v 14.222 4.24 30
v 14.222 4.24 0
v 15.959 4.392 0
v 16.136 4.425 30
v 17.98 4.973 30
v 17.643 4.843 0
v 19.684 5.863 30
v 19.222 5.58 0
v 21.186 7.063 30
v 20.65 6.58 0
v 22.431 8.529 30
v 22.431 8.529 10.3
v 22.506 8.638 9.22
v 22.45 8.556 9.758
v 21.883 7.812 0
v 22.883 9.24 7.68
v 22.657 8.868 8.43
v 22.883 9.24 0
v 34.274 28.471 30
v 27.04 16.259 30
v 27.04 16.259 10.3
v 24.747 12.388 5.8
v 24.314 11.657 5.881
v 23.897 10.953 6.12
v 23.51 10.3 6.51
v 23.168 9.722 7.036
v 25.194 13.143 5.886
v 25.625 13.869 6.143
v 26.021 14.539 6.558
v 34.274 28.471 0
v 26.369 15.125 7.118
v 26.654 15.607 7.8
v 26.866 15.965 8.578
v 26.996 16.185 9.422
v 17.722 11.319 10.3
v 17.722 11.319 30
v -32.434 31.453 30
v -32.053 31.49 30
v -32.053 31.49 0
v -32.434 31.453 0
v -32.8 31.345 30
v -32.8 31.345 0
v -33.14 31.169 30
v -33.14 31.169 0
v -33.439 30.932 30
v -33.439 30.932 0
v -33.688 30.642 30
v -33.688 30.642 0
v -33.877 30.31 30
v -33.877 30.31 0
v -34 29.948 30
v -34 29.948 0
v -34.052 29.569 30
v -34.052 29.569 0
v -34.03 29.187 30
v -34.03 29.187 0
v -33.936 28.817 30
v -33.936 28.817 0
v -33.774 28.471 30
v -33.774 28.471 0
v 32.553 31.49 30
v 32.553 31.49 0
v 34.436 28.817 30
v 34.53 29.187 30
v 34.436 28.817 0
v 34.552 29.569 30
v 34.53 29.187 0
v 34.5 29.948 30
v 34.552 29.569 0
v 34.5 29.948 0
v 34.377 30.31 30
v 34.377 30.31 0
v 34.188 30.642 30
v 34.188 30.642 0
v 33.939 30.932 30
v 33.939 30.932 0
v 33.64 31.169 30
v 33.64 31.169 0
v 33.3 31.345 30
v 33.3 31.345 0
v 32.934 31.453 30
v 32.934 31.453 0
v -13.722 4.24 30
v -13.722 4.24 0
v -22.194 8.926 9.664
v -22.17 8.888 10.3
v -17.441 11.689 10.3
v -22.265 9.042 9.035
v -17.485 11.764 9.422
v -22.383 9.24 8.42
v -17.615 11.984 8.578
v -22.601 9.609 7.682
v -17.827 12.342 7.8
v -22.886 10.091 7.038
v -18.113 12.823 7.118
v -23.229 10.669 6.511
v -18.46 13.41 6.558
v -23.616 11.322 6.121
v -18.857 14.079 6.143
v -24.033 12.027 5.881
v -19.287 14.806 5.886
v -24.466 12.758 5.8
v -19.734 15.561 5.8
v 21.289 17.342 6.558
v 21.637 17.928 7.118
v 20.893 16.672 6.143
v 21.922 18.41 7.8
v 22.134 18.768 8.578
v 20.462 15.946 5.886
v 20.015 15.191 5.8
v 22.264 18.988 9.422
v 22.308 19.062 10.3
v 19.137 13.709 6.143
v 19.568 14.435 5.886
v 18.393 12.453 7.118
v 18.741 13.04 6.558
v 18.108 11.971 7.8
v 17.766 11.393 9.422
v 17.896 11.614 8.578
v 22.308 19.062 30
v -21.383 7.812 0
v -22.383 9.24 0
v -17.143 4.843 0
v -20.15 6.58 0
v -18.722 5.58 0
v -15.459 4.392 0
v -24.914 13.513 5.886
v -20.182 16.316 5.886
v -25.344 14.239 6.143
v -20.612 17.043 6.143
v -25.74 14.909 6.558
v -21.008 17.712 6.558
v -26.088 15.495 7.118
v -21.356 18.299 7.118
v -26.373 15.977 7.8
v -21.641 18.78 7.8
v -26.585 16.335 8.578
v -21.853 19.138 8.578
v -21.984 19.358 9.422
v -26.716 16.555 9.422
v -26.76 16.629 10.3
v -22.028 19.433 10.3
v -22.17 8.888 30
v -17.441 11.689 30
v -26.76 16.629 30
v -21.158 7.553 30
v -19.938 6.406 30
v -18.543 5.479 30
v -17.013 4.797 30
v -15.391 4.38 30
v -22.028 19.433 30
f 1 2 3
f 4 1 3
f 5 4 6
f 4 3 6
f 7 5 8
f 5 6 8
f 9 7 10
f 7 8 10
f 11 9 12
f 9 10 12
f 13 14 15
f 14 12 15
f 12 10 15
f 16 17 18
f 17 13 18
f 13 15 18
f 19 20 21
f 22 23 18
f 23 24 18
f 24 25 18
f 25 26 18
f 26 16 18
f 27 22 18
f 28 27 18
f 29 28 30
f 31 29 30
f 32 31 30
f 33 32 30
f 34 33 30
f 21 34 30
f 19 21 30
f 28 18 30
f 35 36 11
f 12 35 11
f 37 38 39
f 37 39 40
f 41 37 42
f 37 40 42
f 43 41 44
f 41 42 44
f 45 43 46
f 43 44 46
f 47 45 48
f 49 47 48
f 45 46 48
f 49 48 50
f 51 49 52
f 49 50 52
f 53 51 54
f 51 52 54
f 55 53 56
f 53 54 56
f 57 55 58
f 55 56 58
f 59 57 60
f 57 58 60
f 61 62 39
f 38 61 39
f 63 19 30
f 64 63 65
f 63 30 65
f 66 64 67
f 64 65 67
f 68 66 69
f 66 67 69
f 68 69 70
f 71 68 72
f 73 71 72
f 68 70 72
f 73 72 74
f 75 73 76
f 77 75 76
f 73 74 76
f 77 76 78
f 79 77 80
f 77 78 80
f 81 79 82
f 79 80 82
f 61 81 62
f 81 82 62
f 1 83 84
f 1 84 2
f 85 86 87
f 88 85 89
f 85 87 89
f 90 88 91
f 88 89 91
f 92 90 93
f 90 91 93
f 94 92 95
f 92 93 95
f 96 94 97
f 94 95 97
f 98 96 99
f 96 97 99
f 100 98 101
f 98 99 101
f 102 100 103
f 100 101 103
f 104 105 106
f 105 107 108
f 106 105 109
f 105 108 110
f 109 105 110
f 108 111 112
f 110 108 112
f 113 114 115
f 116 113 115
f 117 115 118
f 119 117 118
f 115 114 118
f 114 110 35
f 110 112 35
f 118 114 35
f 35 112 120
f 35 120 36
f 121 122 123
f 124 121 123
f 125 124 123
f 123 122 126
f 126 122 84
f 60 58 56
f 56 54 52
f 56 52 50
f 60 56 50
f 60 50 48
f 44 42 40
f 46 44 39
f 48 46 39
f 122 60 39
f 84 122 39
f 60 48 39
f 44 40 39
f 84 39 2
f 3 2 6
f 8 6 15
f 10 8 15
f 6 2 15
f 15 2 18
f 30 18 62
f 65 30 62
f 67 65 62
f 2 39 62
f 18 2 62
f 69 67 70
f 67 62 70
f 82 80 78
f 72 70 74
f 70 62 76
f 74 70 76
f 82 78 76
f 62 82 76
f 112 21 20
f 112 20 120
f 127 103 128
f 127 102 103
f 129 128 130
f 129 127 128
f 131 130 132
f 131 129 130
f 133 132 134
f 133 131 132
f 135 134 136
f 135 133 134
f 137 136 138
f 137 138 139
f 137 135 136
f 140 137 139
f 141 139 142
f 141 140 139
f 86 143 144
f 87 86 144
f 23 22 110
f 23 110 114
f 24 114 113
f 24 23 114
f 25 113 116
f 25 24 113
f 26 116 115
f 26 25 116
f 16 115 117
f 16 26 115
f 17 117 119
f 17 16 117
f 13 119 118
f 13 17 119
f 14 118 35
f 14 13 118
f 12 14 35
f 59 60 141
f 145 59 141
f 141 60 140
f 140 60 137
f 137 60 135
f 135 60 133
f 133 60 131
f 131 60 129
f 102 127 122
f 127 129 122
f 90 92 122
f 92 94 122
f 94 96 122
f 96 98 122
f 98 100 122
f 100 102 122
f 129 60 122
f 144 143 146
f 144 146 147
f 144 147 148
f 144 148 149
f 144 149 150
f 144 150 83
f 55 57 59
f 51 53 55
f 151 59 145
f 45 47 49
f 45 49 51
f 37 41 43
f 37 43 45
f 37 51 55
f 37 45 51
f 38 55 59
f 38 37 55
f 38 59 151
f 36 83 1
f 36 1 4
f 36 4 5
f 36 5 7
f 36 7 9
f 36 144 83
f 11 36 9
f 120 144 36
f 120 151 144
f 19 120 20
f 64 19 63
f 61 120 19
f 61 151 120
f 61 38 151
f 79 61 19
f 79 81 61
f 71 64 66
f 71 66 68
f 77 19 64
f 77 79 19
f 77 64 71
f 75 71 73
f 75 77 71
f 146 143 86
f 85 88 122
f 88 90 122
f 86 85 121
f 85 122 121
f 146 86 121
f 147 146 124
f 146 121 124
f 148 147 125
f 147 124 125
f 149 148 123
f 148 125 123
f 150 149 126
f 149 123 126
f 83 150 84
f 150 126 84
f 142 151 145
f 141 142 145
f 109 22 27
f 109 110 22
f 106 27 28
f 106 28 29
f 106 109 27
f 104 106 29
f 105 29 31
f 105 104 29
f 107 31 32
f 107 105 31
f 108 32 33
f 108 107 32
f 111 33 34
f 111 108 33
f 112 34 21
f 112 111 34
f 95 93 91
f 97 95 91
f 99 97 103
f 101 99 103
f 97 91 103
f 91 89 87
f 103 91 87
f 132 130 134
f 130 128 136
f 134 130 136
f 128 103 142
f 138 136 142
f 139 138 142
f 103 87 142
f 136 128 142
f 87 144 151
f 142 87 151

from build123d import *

# Parameters (mm, degrees)
F1_DEPTH = 30
F3_DEPTH = 24.2
F4_R     = 4.49999


# Not quite as in the source:
# - a fillet or chamfer is up to 0.001 mm smaller than in the source, because OpenCascade refuses the exact size


with BuildPart() as f1:
    # F0 (on Top) → F1 (new body)
    with BuildSketch(Plane.XY):
        with BuildLine():
            Line((-13.7223101757, 4.24), (14.2223098243, 4.24))
            ThreePointArc((14.2223098243, 4.24), (19.2223098243, 5.5797459622), (22.8825638622, 9.24))
            Line((22.8825638622, 9.24), (34.2739440306, 28.4706991862))
            ThreePointArc((34.2739440306, 28.4706991862), (34.2907944109, 30.4803025731), (32.5531808711, 31.49))
            Line((32.5531808711, 31.49), (-32.0531791289, 31.49))
            ThreePointArc((-32.0531791289, 31.49), (-33.7907926288, 30.4803026431), (-33.7739423706, 28.4706993249))
            Line((-33.7739423706, 28.4706993249), (-22.3825642135, 9.24))
            ThreePointArc((-22.3825642135, 9.24), (-18.7223101757, 5.5797459622), (-13.7223101757, 4.24))
        make_face()
    extrude(amount=F1_DEPTH)

    # F2 (on face) → F3 (cut)
    with BuildSketch(Plane.XY.offset(30)):
        with BuildLine():
            Line((-26.759759987, 16.6294953398), (-22.3825642135, 9.24))
            ThreePointArc((-22.3825642135, 9.24), (-22.2778836833, 9.0629195529), (-22.1695828196, 8.8880298132))
            Line((-22.1695828196, 8.8880298132), (-17.4408080346, 11.6891376089))
            Line((-17.4408080346, 11.6891376089), (-22.0276610725, 19.4325721963))
            Line((-22.0276610725, 19.4325721963), (-26.759759987, 16.6294953398))
        make_face()
        with BuildLine():
            Line((17.7215177836, 11.3189368702), (22.4312077057, 8.5291335532))
            ThreePointArc((22.4312077057, 8.5291335532), (22.6643714442, 8.879813846), (22.8825638622, 9.24))
            Line((22.8825638622, 9.24), (27.0404701341, 16.2592938501))
            Line((27.0404701341, 16.2592938501), (22.3083714455, 19.0623710879))
            Line((22.3083714455, 19.0623710879), (17.7215177836, 11.3189368702))
        make_face()
    extrude(amount=-F3_DEPTH, mode=Mode.SUBTRACT)

    # F4 (radius 4.5 in the source; OpenCascade refuses exactly that, so slightly less here)
    f4_edges = [f1.edges().sort_by_distance(p)[0] for p in [
        (-24.393711, 18.031034, 5.8),
        (-19.805195, 10.288584, 5.8),
        (24.674421, 17.660832, 5.8),
        (20.076363, 9.924035, 5.8),
    ]]
    fillet(f4_edges, radius=F4_R)


solid = f1.part
